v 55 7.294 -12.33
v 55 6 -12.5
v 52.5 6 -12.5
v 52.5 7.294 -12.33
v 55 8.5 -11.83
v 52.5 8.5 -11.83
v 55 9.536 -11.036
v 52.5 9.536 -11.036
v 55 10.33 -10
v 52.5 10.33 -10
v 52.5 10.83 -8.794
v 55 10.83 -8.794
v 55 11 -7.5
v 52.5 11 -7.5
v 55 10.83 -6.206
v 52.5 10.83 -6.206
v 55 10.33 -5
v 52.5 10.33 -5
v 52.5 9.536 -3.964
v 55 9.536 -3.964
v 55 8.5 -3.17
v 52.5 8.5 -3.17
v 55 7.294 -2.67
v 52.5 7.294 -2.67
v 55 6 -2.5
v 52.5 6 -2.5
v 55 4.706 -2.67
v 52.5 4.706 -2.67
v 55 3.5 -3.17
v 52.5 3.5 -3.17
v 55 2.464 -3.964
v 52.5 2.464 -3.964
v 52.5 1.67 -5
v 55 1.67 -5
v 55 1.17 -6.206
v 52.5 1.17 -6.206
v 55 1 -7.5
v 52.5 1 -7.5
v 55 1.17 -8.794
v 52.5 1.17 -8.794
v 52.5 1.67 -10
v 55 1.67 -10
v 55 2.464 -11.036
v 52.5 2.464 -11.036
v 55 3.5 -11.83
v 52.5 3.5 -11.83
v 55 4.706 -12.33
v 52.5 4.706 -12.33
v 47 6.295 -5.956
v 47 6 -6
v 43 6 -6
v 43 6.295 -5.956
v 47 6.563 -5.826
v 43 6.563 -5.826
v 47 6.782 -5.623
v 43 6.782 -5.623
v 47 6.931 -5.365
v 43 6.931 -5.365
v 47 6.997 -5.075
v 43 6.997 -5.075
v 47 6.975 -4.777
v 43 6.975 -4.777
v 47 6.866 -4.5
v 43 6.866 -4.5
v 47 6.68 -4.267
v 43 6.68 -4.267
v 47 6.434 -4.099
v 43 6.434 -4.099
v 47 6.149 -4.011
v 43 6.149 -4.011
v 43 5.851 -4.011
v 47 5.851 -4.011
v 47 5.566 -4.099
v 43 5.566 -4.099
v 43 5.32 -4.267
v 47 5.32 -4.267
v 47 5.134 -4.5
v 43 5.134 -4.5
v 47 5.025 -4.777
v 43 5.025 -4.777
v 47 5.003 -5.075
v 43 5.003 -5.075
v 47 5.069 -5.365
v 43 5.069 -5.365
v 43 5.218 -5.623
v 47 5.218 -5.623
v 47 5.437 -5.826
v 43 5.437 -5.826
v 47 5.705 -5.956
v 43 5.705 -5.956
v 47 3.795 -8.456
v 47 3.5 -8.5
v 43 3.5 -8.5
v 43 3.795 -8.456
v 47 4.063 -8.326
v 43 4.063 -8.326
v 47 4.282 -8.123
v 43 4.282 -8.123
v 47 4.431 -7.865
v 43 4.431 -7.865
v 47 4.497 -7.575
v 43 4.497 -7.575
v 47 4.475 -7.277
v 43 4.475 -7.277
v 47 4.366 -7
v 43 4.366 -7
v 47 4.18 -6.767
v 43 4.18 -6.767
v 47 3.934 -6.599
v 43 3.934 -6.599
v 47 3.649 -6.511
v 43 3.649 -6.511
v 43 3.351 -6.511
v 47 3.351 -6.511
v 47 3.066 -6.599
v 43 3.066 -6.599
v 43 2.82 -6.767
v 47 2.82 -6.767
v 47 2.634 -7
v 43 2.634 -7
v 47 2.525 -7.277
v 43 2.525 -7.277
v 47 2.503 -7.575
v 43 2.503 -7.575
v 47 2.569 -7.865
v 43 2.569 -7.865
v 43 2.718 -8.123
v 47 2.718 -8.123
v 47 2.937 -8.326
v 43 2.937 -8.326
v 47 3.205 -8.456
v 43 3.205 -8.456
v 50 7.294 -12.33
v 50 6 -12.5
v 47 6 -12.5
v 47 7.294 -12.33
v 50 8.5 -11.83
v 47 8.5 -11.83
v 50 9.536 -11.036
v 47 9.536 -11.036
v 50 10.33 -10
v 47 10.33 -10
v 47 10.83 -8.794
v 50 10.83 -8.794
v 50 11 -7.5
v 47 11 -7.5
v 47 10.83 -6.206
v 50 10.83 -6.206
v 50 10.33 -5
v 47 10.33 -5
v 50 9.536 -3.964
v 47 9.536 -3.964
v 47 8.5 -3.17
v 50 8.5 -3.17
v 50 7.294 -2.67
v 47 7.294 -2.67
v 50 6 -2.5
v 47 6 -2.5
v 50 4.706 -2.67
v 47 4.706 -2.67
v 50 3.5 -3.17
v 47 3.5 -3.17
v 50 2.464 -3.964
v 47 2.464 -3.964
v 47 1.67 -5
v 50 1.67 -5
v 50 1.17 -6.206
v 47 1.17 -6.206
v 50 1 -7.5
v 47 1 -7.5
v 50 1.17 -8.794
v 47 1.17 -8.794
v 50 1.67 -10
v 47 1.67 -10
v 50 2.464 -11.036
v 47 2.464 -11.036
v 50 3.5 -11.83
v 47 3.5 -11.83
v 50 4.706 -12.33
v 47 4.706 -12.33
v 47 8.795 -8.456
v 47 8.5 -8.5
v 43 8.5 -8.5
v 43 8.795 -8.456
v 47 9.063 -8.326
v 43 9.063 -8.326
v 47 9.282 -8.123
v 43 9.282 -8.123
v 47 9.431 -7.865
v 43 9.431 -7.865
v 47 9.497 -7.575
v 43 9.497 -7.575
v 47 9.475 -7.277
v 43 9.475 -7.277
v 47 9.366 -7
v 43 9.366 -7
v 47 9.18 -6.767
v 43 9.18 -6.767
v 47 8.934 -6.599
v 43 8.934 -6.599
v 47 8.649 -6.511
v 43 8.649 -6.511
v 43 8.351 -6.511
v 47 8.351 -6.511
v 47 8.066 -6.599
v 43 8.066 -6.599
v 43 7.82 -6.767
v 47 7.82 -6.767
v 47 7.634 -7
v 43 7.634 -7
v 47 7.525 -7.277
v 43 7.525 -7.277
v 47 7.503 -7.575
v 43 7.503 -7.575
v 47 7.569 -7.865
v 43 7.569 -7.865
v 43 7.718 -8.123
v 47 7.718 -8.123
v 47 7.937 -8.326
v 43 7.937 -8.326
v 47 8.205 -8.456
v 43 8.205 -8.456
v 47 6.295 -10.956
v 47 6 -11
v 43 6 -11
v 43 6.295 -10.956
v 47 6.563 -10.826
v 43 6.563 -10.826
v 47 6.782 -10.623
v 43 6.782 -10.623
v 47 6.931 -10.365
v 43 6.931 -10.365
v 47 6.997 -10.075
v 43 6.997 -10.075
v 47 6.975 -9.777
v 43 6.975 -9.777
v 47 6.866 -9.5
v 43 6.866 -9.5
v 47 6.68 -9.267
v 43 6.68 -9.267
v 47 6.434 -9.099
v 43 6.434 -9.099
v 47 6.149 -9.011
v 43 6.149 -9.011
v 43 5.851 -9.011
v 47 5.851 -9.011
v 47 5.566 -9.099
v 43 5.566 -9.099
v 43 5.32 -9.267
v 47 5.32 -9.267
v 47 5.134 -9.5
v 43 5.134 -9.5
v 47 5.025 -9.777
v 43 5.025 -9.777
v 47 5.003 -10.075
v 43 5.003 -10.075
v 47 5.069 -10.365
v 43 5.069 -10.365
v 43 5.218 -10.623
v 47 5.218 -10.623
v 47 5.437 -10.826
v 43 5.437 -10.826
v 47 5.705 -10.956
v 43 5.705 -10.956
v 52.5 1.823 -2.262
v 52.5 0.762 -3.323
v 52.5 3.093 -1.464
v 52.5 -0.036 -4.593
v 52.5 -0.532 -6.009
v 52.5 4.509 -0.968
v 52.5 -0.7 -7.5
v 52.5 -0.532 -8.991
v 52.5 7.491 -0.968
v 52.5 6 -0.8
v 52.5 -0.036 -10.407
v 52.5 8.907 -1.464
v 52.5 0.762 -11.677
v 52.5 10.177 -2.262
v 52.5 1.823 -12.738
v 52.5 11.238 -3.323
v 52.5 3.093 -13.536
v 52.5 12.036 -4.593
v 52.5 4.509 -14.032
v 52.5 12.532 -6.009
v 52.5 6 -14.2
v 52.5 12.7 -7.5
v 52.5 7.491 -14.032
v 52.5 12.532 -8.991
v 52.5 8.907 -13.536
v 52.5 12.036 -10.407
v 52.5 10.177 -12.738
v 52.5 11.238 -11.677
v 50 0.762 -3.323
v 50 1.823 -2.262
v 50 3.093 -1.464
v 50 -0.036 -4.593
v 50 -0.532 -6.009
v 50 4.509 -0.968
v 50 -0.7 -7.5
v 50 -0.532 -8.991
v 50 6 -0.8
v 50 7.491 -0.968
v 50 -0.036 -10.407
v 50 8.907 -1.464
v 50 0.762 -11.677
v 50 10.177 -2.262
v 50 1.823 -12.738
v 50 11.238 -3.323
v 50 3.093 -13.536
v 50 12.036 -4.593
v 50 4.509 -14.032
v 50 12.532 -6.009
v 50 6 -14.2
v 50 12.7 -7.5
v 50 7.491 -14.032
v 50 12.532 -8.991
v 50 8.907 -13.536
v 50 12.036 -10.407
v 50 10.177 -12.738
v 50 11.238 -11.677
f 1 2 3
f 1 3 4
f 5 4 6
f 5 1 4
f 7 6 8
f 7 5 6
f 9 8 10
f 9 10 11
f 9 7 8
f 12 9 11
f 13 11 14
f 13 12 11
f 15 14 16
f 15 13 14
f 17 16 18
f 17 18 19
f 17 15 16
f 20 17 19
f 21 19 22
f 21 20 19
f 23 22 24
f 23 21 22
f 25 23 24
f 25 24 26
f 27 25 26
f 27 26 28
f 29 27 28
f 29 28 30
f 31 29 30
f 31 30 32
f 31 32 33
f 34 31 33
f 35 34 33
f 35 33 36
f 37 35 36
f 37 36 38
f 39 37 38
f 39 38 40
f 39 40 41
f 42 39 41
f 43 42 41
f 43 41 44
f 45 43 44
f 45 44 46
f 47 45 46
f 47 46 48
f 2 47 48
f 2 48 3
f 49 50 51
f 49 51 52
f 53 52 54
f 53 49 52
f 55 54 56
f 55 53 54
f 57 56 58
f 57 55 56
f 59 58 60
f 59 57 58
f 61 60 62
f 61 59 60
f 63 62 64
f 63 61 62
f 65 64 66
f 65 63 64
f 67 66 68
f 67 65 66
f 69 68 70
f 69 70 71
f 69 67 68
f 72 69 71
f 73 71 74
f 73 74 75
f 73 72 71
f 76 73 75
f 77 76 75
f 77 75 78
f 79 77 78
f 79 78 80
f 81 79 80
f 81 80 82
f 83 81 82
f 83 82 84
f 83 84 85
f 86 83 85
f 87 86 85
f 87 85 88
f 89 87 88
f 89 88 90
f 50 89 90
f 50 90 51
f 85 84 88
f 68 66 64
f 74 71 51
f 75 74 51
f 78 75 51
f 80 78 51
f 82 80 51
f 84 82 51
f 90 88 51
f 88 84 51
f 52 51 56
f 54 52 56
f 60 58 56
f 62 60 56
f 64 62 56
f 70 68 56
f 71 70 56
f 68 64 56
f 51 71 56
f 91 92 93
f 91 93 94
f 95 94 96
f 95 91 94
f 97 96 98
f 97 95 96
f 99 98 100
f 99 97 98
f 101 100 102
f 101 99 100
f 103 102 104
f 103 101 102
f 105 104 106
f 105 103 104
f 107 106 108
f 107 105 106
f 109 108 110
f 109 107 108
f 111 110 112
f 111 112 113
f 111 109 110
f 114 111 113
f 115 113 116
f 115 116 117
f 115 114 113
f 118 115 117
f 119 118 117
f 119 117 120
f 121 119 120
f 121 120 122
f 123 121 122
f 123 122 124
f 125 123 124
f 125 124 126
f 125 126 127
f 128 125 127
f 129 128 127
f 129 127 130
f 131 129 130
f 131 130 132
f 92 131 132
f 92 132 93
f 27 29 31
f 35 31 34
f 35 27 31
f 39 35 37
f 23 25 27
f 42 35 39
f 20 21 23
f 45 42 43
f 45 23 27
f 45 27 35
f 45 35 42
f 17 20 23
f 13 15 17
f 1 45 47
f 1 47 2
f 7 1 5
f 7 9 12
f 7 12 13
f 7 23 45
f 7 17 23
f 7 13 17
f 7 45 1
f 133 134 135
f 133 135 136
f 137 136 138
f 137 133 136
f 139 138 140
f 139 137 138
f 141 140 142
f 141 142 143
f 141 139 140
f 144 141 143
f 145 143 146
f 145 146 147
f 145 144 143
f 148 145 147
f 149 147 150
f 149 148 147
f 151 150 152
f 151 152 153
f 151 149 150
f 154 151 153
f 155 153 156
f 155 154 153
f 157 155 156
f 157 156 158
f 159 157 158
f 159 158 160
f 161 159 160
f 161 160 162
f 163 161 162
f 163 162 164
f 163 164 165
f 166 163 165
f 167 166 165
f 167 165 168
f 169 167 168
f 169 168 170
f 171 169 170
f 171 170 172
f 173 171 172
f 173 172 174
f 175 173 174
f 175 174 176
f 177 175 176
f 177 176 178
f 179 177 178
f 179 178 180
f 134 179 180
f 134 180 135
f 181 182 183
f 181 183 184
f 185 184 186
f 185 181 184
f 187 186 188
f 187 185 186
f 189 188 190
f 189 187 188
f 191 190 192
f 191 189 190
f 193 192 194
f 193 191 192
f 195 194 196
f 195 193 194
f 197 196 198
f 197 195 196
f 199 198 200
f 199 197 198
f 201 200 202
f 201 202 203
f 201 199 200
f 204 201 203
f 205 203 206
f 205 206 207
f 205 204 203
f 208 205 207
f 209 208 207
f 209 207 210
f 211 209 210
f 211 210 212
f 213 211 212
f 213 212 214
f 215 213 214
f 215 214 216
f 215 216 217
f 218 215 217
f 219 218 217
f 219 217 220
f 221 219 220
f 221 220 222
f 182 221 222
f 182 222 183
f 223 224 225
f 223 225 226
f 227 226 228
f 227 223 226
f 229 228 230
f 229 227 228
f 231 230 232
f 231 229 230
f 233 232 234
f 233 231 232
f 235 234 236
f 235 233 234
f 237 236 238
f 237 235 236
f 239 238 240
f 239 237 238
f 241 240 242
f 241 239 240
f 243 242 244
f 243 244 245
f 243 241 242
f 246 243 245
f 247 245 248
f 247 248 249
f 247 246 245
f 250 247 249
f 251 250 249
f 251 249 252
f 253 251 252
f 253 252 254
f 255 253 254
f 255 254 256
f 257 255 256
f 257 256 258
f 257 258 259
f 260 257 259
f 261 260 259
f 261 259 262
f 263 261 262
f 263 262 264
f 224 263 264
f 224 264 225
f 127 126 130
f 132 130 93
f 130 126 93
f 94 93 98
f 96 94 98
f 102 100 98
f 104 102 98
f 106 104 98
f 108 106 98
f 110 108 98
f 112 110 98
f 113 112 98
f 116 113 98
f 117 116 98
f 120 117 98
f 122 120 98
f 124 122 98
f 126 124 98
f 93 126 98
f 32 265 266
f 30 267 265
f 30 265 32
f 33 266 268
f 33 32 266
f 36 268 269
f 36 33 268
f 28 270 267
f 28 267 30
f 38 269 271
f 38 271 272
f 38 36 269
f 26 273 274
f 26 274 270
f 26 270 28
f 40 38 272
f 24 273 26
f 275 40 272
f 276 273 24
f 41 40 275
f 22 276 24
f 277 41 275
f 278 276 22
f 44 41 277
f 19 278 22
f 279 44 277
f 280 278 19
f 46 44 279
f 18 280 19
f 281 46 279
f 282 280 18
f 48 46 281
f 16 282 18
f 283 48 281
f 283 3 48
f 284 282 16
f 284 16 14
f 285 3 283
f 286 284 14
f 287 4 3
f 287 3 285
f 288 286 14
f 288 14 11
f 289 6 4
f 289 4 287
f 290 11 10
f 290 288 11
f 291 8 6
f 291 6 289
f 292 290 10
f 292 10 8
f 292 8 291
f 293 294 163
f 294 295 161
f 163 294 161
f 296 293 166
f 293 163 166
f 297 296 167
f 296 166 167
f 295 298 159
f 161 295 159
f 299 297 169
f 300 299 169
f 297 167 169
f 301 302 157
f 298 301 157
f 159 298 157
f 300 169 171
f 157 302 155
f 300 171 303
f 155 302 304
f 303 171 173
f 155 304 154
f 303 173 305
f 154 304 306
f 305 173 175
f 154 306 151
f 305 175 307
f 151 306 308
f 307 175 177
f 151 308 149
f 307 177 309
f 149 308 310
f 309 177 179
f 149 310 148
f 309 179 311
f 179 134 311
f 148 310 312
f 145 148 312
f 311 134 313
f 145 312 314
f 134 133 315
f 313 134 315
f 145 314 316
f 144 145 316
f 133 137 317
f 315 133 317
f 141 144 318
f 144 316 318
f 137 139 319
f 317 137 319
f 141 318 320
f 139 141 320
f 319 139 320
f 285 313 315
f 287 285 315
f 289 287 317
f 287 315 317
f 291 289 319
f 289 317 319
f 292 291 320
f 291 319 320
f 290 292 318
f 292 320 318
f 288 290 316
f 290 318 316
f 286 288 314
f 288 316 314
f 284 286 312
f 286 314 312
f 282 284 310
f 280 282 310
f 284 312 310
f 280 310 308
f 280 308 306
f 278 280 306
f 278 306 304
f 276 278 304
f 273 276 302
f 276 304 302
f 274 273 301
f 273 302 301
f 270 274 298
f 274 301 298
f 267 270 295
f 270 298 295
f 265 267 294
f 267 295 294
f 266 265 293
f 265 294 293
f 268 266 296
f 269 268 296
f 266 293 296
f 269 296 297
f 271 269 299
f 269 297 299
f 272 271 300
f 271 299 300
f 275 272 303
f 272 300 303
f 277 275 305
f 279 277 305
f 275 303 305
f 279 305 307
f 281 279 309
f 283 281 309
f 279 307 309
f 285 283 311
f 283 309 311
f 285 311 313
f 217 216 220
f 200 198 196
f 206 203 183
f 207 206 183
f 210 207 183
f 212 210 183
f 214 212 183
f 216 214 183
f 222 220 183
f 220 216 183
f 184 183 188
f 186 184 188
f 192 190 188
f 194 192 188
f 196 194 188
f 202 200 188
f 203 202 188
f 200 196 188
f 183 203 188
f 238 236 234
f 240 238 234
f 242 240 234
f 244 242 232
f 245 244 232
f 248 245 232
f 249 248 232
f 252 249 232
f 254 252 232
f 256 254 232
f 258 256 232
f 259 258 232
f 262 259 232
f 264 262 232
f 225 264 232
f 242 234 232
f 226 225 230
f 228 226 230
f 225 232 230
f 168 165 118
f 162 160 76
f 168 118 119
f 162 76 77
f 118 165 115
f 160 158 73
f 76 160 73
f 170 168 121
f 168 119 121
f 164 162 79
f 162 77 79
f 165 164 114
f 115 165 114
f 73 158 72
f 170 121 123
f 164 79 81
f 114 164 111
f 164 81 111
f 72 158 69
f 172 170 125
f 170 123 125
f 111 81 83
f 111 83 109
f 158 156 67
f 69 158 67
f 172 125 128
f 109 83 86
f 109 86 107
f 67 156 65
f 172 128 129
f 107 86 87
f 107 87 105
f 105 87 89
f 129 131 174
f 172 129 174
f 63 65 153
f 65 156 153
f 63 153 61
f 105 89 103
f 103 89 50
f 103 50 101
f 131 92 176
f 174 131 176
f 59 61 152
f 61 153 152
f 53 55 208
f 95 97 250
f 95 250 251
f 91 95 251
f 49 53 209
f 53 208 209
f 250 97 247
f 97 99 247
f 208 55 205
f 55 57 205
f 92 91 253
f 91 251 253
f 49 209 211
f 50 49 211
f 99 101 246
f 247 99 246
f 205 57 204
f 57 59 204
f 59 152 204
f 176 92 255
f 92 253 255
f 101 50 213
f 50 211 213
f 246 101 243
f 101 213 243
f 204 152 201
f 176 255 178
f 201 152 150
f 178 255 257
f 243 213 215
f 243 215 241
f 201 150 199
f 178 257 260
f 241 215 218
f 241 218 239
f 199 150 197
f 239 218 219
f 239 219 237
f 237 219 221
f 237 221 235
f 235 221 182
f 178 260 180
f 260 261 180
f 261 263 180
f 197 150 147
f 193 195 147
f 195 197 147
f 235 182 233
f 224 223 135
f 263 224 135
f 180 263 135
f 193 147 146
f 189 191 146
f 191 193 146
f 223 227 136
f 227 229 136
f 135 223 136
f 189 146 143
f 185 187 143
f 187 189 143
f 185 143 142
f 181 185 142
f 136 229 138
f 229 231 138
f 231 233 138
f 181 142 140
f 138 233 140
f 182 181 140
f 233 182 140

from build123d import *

# Parameters (mm, degrees)
SKETCH002_R             = 5
PAD002_DEPTH            = 8
SKETCH003_R             = 6.7
PAD003_DEPTH            = 2.5
SKETCH004_R             = 1
PAD004_DEPTH            = 12
BODY001_PLACEMENT_ANGLE = 90


with BuildPart() as part:
    # Sketch002 → Pad002 (new body)
    with BuildSketch(Plane.XY):
        Circle(SKETCH002_R)
    extrude(amount=-PAD002_DEPTH)

    # Sketch003 → Pad003 (join)
    with BuildSketch(Plane.XY.offset(-5)):
        Circle(SKETCH003_R)
    extrude(amount=PAD003_DEPTH)

    # Sketch004 → Pad004 (join)
    with BuildSketch(Plane.XY):
        with Locations((2.5, 0)):
            Circle(SKETCH004_R)
        with Locations((-2.5, 0)):
            Circle(SKETCH004_R)
        with Locations((0, 2.5)):
            Circle(SKETCH004_R)
        with Locations((0, -2.5)):
            Circle(SKETCH004_R)
    extrude(amount=-PAD004_DEPTH)


with BuildPart() as part_1:
    # Body001 placement: moved
    add(part.part.moved(Location((55, 6, -7.5))).rotate(Axis((55, 6, -7.5), (0, 1, 0)), BODY001_PLACEMENT_ANGLE))


solid = part_1.part
